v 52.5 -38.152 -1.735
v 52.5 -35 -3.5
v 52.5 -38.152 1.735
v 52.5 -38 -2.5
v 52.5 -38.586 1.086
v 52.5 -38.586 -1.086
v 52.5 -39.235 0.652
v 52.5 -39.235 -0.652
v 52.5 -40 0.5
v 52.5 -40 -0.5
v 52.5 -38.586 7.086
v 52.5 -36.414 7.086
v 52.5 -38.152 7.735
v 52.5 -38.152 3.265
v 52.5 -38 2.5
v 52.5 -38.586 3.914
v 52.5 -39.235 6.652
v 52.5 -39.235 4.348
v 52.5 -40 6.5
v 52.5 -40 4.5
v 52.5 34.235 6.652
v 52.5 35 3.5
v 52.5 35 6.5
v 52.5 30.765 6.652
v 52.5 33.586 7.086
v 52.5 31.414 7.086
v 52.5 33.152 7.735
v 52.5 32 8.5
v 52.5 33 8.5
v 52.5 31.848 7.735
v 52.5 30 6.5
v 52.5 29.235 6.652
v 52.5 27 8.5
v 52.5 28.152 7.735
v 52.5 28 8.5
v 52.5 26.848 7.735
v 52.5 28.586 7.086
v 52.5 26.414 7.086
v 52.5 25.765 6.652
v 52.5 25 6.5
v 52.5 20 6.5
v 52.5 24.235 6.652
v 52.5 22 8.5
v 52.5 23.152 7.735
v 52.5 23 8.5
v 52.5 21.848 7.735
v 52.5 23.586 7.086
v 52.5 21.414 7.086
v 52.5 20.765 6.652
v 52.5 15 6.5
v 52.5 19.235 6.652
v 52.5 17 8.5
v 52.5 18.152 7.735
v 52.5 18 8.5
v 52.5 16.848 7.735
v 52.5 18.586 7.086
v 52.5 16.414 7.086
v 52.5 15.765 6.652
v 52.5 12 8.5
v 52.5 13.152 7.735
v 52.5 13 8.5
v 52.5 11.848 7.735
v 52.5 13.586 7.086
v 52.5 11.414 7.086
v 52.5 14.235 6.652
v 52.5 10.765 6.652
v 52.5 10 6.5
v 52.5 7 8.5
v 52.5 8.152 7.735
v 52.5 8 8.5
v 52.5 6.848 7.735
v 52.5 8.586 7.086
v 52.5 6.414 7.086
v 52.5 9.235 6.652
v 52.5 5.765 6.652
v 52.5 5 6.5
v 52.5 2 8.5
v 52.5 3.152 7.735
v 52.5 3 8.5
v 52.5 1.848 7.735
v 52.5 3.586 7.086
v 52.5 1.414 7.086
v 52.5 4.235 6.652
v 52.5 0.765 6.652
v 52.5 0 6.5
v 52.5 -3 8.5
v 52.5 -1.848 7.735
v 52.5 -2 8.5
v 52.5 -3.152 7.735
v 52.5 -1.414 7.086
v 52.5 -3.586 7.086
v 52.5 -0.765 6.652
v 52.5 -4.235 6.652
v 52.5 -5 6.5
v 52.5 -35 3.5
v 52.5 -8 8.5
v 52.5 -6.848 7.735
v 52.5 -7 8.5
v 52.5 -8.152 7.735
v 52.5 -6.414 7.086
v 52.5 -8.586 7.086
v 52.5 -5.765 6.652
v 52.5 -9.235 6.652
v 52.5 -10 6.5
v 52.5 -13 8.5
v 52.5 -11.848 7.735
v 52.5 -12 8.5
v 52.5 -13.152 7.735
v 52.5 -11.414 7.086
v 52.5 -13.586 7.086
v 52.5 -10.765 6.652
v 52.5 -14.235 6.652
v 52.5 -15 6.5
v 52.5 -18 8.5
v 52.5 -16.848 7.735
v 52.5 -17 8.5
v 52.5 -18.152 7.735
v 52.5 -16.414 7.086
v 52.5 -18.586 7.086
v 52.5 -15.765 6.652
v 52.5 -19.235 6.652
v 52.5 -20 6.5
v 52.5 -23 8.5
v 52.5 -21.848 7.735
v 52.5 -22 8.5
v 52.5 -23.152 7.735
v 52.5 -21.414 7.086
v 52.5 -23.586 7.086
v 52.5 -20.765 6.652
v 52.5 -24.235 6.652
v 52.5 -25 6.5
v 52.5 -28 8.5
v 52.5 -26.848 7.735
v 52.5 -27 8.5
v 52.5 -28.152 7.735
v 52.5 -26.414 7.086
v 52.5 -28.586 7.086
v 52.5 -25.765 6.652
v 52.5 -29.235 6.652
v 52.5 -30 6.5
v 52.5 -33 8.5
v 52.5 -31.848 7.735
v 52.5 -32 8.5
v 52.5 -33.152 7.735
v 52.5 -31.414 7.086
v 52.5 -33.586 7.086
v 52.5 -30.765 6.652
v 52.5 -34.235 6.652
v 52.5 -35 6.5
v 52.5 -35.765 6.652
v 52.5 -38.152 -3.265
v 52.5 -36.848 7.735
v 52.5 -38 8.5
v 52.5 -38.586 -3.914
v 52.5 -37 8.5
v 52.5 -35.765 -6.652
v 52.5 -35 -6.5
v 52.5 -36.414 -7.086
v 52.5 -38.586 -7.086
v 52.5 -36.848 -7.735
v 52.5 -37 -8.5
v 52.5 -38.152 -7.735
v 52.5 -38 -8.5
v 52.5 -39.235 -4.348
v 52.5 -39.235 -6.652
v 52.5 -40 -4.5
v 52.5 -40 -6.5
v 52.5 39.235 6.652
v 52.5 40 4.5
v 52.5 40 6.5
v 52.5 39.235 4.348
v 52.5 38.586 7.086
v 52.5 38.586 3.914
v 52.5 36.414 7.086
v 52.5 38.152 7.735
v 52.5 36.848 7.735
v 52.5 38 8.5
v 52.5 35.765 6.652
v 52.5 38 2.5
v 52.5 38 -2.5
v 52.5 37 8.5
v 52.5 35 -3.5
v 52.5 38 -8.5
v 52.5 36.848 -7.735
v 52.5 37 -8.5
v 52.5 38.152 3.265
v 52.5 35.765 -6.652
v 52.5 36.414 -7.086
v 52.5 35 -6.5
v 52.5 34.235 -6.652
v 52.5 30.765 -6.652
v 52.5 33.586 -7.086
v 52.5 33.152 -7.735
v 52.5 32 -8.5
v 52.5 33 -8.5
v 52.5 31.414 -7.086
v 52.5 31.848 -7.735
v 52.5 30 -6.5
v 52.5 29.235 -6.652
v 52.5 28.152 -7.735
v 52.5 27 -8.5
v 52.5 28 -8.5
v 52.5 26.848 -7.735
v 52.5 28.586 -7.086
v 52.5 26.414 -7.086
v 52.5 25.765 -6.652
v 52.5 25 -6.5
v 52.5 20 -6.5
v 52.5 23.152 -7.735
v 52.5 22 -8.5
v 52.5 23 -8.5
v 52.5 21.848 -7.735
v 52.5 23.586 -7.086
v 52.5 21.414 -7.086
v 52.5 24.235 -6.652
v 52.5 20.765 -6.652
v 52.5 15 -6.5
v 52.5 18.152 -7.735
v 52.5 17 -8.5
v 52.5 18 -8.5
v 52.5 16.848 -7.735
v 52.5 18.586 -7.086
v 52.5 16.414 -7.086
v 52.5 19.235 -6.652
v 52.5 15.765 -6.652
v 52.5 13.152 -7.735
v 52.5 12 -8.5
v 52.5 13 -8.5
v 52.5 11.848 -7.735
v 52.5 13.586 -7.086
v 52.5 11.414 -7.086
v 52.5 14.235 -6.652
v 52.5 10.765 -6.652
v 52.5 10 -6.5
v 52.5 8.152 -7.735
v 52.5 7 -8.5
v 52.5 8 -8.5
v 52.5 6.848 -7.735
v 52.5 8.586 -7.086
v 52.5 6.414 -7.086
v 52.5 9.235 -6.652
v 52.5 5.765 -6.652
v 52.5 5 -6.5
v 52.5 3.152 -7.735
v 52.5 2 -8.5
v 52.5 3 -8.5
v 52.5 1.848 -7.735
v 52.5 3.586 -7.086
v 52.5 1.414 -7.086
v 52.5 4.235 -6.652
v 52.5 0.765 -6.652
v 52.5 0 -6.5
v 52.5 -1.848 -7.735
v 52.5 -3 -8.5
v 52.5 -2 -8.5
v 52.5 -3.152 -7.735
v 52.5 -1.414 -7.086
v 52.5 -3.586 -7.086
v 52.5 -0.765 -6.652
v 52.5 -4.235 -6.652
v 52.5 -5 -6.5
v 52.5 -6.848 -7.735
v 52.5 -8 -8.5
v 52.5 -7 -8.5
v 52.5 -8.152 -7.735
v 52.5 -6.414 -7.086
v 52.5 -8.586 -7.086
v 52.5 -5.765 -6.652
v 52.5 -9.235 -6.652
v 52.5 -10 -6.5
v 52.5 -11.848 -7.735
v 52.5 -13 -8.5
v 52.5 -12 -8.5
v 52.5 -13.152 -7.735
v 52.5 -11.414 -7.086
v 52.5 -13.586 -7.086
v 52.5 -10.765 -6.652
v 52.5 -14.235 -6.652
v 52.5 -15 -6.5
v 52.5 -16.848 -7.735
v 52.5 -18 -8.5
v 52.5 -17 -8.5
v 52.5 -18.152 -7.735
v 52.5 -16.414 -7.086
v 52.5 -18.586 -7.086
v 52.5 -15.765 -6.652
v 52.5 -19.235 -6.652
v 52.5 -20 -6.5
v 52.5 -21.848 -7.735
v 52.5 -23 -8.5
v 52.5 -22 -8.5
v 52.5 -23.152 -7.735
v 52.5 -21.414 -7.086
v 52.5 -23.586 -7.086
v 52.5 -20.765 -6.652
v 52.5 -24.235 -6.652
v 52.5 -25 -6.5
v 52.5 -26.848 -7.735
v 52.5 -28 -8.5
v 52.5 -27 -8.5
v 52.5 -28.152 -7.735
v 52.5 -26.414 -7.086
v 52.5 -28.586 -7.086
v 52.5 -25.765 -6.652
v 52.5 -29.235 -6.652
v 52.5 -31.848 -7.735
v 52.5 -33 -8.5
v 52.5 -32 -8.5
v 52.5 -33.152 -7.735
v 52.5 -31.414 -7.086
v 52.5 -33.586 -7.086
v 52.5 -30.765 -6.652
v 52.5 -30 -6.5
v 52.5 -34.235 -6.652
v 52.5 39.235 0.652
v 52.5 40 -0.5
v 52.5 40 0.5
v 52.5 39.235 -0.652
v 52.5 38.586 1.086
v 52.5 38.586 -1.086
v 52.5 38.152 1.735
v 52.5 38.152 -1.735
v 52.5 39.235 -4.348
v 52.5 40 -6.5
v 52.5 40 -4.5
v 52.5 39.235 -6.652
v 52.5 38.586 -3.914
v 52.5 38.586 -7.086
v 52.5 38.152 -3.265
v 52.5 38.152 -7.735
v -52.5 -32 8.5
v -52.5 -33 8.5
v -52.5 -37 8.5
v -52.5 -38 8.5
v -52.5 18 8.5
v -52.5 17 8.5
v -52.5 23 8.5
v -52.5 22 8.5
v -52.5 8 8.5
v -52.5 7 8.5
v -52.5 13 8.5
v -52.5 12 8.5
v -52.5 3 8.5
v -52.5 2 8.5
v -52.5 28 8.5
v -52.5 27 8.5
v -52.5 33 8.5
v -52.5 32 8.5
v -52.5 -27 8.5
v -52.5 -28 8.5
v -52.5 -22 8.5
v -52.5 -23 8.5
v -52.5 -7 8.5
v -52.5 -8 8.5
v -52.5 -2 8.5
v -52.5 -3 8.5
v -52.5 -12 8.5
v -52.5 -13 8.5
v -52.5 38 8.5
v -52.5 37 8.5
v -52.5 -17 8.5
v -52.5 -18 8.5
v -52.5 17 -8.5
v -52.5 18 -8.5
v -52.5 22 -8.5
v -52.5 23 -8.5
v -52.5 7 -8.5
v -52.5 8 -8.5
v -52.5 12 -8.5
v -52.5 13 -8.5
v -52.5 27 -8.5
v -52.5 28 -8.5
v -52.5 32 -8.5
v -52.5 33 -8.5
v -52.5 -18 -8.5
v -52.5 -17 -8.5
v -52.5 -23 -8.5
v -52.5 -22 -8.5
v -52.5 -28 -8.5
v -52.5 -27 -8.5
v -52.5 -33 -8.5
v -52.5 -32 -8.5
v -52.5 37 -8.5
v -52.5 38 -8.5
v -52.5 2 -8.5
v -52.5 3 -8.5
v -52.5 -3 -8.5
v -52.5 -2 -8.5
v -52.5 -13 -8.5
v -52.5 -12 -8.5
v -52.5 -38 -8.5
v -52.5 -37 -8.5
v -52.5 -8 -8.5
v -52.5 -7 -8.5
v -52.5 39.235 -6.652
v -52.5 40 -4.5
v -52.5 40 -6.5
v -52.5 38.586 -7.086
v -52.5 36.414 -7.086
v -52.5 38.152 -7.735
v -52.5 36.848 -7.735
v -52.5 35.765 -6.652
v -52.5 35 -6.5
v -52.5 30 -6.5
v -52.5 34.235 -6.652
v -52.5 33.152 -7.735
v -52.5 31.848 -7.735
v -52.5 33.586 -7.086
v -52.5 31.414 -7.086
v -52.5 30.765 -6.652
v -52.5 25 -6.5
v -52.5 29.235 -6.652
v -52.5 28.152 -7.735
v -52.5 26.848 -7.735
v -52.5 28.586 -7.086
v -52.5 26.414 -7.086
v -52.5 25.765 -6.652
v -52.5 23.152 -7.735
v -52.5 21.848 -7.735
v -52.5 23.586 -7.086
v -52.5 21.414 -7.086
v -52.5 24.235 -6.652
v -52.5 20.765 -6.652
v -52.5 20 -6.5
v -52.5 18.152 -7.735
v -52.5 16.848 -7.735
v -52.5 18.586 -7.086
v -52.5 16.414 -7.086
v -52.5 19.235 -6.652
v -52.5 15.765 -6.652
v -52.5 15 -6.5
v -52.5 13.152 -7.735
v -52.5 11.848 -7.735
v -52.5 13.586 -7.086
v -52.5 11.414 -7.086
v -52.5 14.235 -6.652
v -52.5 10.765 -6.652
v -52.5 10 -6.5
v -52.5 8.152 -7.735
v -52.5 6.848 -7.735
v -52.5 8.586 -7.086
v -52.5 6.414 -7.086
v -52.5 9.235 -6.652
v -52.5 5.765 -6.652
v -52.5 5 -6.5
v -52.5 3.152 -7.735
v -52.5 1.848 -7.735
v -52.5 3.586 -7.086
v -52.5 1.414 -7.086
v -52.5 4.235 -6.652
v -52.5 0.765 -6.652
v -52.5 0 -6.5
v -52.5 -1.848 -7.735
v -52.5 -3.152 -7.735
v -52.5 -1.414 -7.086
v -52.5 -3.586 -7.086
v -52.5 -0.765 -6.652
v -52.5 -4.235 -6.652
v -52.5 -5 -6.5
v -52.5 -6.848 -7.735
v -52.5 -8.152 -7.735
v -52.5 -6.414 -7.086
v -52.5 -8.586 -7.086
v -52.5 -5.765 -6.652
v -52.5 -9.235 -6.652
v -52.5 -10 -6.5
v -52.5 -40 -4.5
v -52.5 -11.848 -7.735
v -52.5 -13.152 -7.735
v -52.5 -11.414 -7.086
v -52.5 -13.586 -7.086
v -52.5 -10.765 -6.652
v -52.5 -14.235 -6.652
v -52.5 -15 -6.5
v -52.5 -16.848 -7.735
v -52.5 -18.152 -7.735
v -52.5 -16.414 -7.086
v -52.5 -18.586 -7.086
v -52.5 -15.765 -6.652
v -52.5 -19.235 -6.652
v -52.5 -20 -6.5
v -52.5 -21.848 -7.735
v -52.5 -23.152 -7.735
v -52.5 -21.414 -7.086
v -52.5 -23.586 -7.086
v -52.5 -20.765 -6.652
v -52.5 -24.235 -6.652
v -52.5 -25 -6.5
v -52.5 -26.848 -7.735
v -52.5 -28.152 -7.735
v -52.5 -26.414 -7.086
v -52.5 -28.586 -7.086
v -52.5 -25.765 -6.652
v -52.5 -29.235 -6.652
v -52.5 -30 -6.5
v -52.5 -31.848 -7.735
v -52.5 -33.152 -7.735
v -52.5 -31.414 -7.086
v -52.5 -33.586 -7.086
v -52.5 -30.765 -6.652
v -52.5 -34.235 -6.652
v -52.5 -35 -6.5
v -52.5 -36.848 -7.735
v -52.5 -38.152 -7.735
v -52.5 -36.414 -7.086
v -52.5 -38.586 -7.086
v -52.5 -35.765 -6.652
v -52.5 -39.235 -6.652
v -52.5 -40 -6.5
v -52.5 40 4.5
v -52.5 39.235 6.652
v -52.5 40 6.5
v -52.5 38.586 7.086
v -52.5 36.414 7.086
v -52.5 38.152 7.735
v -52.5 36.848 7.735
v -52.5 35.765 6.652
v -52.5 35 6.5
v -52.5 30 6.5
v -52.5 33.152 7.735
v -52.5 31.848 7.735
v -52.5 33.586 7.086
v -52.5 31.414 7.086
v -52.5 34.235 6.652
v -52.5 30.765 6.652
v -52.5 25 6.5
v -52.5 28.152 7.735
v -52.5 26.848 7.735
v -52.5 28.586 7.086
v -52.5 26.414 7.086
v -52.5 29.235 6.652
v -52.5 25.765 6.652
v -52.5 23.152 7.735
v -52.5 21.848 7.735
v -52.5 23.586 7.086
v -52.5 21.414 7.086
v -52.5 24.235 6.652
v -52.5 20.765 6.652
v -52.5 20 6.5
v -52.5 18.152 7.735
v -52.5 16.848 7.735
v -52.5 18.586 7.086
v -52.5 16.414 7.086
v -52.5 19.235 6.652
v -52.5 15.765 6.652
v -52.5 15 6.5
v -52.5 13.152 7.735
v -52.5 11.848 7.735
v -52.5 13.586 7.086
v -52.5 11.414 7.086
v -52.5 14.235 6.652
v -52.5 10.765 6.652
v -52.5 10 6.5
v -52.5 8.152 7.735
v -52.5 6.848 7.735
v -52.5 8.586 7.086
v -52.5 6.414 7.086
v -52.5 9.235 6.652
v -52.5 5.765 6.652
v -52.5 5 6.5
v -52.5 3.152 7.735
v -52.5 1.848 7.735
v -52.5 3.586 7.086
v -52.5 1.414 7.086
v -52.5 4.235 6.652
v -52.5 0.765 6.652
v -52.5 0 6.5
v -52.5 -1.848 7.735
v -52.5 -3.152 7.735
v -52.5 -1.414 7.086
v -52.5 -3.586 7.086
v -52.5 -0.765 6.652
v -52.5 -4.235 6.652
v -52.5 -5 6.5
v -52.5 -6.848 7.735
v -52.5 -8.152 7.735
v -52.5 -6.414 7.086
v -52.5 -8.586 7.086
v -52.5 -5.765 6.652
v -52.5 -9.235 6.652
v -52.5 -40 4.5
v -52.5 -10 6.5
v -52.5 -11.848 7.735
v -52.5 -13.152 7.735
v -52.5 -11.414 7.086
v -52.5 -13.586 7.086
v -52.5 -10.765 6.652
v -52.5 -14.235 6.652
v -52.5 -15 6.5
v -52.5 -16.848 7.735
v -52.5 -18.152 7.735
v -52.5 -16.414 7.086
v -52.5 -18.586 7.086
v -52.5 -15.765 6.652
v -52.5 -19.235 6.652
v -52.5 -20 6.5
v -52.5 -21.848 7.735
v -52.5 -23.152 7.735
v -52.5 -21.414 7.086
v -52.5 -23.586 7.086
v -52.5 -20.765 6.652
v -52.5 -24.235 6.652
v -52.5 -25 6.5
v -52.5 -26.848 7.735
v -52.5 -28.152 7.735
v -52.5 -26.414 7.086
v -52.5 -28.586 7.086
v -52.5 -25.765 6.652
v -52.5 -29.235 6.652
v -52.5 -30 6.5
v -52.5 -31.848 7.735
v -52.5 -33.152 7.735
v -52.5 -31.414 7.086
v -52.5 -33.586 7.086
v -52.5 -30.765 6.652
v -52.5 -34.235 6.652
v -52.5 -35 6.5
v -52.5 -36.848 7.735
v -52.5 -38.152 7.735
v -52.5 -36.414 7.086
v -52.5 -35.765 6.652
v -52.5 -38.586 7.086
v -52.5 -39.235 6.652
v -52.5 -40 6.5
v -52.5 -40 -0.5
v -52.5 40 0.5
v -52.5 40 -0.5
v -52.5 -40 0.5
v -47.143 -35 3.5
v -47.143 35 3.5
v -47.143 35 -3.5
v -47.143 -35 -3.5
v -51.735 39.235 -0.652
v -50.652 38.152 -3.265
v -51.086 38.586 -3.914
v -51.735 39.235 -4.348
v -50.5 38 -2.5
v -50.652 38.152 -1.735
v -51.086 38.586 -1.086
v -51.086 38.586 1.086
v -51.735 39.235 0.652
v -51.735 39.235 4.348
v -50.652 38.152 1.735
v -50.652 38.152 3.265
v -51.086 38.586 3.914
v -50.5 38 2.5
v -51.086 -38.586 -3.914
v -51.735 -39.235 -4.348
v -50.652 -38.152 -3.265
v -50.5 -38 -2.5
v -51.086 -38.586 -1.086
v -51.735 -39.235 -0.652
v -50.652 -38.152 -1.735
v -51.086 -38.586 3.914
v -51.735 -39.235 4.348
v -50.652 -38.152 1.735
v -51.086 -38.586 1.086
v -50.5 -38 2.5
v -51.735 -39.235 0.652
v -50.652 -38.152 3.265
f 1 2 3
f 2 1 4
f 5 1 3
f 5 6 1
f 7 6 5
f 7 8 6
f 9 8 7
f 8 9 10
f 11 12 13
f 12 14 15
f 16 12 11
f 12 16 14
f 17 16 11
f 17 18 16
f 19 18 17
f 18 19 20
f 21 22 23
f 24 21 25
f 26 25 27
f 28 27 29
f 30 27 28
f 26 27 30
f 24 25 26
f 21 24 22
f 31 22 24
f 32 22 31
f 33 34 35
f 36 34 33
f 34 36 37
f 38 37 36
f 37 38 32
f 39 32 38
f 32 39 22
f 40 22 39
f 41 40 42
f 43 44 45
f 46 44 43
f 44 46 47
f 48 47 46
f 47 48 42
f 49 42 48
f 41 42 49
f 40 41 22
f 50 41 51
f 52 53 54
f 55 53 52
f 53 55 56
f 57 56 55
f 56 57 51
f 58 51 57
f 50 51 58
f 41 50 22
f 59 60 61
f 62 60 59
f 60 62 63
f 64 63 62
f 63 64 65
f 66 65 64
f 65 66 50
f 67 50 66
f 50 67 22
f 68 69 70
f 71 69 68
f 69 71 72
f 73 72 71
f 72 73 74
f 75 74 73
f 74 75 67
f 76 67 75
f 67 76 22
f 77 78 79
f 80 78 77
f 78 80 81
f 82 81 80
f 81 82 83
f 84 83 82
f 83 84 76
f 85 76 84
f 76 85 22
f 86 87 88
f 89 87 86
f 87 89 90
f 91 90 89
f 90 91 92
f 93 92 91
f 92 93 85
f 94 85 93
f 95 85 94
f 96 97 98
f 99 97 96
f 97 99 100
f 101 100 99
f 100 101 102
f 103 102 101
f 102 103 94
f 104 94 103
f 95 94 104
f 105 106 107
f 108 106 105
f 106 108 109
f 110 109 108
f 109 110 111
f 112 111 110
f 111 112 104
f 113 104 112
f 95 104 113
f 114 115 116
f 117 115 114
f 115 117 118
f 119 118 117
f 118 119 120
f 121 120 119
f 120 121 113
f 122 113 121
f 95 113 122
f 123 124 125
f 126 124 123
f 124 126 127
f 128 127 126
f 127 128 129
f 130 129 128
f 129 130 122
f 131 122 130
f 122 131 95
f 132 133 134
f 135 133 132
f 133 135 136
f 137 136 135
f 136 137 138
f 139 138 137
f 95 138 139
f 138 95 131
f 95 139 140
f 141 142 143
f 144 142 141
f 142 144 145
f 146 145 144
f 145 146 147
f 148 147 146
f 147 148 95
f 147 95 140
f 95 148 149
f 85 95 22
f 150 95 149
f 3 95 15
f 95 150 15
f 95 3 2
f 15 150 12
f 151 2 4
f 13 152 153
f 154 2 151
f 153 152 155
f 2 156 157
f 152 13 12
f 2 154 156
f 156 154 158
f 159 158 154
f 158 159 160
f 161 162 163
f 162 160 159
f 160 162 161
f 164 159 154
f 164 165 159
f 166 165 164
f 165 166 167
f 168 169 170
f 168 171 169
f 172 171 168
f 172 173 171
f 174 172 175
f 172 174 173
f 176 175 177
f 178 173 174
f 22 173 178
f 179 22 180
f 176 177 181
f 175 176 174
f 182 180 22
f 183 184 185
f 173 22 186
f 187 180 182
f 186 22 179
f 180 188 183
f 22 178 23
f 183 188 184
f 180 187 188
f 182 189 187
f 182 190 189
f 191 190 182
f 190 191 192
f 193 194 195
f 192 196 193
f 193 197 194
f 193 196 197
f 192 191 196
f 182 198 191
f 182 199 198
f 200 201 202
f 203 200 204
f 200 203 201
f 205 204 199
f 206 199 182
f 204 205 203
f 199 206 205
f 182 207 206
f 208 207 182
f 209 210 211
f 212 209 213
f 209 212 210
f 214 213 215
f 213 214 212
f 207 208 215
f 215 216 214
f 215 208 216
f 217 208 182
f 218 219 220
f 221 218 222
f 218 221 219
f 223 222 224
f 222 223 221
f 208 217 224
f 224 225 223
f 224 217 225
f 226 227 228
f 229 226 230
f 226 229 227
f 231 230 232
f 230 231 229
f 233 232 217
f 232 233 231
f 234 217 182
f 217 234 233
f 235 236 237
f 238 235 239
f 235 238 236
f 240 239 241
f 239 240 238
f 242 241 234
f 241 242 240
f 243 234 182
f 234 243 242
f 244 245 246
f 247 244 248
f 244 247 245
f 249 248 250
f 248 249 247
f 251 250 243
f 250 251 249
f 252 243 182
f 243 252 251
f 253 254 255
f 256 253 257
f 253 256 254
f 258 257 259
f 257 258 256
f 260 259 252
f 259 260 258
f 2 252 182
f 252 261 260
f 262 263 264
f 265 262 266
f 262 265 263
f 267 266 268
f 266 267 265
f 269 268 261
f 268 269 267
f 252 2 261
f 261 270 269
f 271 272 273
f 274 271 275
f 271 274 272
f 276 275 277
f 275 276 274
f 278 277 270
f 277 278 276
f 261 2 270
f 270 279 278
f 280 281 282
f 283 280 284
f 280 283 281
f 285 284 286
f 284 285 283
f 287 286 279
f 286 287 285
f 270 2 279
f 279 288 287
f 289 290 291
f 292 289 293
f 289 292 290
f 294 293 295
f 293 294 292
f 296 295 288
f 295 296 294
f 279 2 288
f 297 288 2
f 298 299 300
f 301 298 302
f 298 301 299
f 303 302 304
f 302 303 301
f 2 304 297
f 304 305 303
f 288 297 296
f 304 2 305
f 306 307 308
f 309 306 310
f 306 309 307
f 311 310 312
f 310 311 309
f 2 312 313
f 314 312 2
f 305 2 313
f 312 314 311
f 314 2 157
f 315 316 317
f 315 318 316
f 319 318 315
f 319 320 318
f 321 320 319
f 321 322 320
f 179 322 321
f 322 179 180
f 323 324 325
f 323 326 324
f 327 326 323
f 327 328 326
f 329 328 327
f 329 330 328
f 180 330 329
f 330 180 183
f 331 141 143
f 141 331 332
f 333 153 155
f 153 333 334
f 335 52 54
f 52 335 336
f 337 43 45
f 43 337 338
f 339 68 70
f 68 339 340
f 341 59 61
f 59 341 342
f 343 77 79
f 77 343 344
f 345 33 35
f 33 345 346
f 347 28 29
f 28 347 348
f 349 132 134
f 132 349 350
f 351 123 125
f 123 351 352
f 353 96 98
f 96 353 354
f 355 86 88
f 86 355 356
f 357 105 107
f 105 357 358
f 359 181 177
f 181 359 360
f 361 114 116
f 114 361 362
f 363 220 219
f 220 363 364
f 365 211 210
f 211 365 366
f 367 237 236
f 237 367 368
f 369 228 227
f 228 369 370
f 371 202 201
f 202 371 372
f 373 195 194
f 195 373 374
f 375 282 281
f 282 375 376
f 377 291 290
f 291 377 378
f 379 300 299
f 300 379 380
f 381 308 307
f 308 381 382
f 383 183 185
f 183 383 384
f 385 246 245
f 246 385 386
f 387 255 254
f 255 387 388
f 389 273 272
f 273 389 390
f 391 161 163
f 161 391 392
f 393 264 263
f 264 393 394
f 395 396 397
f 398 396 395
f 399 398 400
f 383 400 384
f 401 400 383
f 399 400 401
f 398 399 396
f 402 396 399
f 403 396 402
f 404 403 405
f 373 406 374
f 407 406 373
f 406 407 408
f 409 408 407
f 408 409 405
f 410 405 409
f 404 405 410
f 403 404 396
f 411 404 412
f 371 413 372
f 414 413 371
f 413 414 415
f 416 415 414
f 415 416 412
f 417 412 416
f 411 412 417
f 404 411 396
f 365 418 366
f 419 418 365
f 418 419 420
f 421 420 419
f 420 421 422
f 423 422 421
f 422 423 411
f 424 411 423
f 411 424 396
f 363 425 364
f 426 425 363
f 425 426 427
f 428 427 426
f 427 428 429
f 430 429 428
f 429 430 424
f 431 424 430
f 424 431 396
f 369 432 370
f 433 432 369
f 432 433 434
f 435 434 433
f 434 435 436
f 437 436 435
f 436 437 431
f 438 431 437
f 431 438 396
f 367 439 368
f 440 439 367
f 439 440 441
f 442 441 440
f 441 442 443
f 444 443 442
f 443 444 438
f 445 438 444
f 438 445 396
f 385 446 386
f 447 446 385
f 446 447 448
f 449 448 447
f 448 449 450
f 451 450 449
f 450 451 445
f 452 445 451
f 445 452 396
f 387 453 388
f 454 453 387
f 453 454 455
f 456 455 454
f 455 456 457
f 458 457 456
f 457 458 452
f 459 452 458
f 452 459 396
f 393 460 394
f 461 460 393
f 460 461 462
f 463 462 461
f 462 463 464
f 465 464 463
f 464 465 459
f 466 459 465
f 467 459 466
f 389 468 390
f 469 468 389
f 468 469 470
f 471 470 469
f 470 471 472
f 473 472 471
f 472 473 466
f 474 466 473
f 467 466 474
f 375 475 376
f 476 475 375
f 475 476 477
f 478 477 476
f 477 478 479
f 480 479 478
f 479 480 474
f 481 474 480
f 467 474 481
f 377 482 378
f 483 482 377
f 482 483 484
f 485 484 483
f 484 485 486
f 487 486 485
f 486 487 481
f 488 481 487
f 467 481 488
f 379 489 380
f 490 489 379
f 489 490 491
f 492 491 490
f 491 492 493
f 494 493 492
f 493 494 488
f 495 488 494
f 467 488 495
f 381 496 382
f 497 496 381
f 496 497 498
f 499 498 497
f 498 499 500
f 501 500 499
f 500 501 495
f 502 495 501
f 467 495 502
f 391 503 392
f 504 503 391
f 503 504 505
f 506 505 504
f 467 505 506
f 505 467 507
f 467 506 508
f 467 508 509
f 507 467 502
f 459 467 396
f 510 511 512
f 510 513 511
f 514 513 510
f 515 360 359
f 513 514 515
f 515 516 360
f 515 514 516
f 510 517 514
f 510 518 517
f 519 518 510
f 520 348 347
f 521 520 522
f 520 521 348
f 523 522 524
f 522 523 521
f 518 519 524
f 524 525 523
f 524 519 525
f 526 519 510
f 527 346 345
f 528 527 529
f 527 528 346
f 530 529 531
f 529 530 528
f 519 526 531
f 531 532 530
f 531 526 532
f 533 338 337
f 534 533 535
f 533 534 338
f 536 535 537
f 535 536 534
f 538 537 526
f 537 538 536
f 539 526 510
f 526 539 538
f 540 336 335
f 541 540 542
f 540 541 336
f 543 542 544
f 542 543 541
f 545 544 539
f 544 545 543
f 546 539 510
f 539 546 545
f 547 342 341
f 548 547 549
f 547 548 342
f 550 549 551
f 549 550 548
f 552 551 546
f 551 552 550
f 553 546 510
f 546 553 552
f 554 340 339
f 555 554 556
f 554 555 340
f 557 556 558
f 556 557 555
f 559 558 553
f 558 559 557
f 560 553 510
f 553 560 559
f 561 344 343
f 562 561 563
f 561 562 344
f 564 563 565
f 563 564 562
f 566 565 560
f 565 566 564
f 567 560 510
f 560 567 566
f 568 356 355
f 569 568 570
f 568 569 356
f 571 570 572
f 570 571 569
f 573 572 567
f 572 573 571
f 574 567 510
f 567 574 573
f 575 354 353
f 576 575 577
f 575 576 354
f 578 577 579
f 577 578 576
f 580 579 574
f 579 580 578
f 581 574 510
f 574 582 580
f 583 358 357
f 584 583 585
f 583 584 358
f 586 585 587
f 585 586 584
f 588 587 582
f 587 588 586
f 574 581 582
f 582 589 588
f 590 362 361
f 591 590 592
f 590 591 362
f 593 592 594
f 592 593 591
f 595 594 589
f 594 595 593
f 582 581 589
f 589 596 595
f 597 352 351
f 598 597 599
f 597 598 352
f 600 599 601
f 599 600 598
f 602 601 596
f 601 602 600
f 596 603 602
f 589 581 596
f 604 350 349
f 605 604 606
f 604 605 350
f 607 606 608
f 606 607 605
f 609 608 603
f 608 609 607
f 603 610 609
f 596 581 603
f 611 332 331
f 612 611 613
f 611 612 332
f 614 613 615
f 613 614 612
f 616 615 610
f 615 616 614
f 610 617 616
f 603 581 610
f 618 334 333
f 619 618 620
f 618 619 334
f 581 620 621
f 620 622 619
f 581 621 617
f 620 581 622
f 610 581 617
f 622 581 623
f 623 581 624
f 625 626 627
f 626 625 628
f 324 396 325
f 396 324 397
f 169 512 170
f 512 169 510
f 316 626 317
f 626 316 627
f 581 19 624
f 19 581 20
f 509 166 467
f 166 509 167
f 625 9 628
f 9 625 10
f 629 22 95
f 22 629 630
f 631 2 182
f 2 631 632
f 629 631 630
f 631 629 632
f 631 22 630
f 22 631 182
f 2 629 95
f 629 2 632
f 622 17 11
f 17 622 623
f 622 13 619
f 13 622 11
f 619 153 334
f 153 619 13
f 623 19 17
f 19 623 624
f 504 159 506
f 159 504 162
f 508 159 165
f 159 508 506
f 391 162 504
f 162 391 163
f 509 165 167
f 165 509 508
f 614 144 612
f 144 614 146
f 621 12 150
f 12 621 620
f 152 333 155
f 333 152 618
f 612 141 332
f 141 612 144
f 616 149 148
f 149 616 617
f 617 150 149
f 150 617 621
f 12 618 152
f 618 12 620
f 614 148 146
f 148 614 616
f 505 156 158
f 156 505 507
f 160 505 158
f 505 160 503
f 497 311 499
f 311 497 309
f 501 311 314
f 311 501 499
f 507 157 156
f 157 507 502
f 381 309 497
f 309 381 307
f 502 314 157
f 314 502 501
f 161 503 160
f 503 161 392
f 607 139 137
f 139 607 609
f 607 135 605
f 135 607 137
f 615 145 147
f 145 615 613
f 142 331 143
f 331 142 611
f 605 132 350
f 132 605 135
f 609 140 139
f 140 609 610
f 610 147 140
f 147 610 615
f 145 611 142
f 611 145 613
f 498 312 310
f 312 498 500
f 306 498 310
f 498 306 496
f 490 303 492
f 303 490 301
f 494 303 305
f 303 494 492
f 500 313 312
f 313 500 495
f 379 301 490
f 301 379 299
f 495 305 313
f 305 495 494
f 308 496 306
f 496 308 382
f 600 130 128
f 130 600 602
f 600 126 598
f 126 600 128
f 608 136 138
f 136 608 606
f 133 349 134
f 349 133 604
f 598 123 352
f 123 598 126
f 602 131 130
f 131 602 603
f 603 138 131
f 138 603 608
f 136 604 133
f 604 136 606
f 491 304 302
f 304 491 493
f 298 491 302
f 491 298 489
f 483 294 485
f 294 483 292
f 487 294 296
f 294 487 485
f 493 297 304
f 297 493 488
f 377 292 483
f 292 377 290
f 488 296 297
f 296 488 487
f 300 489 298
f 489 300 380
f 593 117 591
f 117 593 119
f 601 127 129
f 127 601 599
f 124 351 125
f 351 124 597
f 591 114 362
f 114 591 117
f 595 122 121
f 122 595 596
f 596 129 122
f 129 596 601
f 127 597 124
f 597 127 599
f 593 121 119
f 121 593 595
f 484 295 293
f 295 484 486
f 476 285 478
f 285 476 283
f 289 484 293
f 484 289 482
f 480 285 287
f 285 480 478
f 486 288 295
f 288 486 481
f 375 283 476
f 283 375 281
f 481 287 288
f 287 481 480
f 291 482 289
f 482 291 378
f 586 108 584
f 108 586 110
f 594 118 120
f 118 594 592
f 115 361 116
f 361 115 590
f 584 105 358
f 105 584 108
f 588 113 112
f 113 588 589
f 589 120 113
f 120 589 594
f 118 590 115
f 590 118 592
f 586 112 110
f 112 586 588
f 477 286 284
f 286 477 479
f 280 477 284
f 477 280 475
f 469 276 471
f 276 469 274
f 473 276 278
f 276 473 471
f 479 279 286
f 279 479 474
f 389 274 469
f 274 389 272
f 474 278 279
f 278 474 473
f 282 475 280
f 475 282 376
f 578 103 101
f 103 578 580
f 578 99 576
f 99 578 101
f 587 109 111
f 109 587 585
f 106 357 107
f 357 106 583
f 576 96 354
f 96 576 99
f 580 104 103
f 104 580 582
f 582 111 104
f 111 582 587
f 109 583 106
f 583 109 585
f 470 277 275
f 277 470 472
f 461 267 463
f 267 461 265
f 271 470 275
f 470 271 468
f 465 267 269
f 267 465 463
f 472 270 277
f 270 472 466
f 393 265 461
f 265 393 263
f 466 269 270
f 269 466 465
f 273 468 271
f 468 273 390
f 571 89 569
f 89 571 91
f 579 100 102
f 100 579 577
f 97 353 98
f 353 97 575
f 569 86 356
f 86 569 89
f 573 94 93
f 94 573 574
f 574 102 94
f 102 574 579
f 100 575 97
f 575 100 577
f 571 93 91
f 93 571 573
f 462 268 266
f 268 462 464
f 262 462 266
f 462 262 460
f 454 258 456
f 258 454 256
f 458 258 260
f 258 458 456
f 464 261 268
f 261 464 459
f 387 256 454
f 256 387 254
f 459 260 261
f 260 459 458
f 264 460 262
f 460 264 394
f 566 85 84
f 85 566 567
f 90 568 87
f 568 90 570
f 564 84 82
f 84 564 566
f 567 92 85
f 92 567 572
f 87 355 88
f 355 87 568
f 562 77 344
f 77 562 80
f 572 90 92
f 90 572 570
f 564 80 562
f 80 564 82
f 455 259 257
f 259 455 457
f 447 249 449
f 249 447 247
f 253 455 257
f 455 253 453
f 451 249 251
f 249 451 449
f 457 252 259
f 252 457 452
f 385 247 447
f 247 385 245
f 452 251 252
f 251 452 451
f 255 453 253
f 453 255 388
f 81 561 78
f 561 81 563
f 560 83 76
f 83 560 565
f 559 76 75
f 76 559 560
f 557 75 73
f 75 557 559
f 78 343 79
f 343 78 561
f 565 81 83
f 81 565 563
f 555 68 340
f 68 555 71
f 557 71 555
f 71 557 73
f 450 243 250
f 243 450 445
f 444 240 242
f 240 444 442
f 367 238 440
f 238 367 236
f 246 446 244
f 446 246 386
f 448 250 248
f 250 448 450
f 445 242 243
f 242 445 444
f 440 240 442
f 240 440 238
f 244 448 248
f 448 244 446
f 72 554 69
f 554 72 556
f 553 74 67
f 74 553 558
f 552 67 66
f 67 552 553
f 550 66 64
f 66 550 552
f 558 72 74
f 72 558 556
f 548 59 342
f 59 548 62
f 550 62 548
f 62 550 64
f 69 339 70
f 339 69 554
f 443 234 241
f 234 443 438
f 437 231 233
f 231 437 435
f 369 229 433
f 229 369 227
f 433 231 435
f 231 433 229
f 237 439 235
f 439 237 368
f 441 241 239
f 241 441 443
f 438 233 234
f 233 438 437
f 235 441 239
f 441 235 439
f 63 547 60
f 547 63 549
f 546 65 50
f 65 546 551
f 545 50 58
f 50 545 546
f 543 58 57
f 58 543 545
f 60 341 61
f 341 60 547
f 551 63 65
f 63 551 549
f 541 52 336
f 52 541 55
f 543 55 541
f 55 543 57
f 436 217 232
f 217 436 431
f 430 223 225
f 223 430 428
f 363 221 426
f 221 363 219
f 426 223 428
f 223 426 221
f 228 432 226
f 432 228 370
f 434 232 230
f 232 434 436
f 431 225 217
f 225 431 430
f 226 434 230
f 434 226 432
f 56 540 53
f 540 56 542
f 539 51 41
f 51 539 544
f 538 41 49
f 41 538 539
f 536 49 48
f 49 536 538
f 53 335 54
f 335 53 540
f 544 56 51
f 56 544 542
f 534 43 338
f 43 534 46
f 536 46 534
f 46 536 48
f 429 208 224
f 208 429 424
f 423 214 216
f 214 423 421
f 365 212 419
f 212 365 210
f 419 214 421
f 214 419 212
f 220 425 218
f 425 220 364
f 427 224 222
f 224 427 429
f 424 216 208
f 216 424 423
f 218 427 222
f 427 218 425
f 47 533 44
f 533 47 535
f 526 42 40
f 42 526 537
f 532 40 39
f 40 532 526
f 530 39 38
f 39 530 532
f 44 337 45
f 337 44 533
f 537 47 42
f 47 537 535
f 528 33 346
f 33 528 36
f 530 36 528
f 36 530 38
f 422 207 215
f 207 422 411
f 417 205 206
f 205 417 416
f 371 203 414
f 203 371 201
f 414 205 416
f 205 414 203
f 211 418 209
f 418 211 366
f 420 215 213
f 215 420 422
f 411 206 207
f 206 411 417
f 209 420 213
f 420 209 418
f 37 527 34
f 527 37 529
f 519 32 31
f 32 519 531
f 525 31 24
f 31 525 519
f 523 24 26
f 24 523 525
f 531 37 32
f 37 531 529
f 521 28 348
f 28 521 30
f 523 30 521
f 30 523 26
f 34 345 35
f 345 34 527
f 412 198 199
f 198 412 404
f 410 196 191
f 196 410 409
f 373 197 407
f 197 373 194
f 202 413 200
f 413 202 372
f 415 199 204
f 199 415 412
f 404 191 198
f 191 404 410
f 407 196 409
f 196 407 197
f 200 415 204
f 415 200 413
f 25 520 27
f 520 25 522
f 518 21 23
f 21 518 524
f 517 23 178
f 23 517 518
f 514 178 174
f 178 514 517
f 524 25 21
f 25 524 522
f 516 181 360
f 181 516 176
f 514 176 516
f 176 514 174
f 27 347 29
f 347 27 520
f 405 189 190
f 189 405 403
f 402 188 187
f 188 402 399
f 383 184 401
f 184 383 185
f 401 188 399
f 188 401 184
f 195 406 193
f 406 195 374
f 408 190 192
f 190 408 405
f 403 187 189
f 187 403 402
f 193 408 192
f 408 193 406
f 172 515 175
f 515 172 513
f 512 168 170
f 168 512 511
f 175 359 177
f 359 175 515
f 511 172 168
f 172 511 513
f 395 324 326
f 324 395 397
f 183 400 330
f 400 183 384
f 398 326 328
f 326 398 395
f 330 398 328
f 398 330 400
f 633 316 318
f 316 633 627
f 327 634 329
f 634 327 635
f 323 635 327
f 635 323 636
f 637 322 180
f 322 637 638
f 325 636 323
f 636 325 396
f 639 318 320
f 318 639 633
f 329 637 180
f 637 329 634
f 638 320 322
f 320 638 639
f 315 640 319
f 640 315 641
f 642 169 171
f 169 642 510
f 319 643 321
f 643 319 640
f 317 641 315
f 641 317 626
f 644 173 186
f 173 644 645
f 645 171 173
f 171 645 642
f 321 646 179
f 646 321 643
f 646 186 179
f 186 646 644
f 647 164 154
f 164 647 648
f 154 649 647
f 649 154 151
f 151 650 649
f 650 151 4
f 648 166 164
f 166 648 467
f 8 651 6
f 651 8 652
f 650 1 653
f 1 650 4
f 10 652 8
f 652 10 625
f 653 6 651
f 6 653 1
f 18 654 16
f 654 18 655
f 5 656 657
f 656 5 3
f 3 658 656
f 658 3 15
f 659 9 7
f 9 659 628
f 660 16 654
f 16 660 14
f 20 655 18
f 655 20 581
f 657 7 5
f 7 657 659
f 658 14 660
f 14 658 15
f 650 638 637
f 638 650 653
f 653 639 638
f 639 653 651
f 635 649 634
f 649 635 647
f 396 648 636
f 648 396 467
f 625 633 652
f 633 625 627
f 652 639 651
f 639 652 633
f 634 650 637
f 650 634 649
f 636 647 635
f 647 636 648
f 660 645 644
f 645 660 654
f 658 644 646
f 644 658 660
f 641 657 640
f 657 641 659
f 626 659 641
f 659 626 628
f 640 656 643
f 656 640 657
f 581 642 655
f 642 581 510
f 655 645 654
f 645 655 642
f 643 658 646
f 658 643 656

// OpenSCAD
//material: TPU (flexible)

hdd_height      = 7;
hdd_width       = 70;
hdd_length      = 100;
wall_thickness  = 5;
$fn=16;

module box()
{
    difference()
    {
        cube([hdd_length + wall_thickness, hdd_width + 2 * wall_thickness, hdd_height + 2 * wall_thickness], center=true);
        translate([wall_thickness / 1.75, 0, 0])
        {
            cube([hdd_length, hdd_width, hdd_height], center=true);
        }
    }
}

module groove_lon(pos)
{
    translate(pos)
    {
        rotate([0, 90, 0])
        {
            cylinder(hdd_length * 2, wall_thickness / 2.5, wall_thickness / 2.5, center = true);
        }
    }
}

module groove_lat(pos)
{
    translate(pos)
    {
        rotate([90, 0, 0])
        {
            cylinder(hdd_width * 2, wall_thickness / 2.5, wall_thickness / 2.5, center = true);
        }
    }
}

module hdd_case_v_0()
{
    difference()
    {
        box();
        for(y=[-hdd_width:wall_thickness:hdd_width])
        {
            groove_lon([0, y, hdd_height / 2 + wall_thickness]);
            groove_lon([0, y, -hdd_height / 2 - wall_thickness]);
        }
        groove_lon([0, hdd_width / 2 + wall_thickness, -wall_thickness / 2]);
        groove_lon([0, hdd_width / 2 + wall_thickness, wall_thickness / 2]);
        
        groove_lon([0, -hdd_width / 2 - wall_thickness, -wall_thickness / 2]);
        groove_lon([0, -hdd_width / 2 - wall_thickness, wall_thickness / 2]);

        groove_lat([-hdd_length / 2 - wall_thickness / 2, 0, -wall_thickness / 2]);
        groove_lat([-hdd_length / 2 - wall_thickness / 2, 0, wall_thickness / 2]);

    }
}

hdd_case_v_0();
